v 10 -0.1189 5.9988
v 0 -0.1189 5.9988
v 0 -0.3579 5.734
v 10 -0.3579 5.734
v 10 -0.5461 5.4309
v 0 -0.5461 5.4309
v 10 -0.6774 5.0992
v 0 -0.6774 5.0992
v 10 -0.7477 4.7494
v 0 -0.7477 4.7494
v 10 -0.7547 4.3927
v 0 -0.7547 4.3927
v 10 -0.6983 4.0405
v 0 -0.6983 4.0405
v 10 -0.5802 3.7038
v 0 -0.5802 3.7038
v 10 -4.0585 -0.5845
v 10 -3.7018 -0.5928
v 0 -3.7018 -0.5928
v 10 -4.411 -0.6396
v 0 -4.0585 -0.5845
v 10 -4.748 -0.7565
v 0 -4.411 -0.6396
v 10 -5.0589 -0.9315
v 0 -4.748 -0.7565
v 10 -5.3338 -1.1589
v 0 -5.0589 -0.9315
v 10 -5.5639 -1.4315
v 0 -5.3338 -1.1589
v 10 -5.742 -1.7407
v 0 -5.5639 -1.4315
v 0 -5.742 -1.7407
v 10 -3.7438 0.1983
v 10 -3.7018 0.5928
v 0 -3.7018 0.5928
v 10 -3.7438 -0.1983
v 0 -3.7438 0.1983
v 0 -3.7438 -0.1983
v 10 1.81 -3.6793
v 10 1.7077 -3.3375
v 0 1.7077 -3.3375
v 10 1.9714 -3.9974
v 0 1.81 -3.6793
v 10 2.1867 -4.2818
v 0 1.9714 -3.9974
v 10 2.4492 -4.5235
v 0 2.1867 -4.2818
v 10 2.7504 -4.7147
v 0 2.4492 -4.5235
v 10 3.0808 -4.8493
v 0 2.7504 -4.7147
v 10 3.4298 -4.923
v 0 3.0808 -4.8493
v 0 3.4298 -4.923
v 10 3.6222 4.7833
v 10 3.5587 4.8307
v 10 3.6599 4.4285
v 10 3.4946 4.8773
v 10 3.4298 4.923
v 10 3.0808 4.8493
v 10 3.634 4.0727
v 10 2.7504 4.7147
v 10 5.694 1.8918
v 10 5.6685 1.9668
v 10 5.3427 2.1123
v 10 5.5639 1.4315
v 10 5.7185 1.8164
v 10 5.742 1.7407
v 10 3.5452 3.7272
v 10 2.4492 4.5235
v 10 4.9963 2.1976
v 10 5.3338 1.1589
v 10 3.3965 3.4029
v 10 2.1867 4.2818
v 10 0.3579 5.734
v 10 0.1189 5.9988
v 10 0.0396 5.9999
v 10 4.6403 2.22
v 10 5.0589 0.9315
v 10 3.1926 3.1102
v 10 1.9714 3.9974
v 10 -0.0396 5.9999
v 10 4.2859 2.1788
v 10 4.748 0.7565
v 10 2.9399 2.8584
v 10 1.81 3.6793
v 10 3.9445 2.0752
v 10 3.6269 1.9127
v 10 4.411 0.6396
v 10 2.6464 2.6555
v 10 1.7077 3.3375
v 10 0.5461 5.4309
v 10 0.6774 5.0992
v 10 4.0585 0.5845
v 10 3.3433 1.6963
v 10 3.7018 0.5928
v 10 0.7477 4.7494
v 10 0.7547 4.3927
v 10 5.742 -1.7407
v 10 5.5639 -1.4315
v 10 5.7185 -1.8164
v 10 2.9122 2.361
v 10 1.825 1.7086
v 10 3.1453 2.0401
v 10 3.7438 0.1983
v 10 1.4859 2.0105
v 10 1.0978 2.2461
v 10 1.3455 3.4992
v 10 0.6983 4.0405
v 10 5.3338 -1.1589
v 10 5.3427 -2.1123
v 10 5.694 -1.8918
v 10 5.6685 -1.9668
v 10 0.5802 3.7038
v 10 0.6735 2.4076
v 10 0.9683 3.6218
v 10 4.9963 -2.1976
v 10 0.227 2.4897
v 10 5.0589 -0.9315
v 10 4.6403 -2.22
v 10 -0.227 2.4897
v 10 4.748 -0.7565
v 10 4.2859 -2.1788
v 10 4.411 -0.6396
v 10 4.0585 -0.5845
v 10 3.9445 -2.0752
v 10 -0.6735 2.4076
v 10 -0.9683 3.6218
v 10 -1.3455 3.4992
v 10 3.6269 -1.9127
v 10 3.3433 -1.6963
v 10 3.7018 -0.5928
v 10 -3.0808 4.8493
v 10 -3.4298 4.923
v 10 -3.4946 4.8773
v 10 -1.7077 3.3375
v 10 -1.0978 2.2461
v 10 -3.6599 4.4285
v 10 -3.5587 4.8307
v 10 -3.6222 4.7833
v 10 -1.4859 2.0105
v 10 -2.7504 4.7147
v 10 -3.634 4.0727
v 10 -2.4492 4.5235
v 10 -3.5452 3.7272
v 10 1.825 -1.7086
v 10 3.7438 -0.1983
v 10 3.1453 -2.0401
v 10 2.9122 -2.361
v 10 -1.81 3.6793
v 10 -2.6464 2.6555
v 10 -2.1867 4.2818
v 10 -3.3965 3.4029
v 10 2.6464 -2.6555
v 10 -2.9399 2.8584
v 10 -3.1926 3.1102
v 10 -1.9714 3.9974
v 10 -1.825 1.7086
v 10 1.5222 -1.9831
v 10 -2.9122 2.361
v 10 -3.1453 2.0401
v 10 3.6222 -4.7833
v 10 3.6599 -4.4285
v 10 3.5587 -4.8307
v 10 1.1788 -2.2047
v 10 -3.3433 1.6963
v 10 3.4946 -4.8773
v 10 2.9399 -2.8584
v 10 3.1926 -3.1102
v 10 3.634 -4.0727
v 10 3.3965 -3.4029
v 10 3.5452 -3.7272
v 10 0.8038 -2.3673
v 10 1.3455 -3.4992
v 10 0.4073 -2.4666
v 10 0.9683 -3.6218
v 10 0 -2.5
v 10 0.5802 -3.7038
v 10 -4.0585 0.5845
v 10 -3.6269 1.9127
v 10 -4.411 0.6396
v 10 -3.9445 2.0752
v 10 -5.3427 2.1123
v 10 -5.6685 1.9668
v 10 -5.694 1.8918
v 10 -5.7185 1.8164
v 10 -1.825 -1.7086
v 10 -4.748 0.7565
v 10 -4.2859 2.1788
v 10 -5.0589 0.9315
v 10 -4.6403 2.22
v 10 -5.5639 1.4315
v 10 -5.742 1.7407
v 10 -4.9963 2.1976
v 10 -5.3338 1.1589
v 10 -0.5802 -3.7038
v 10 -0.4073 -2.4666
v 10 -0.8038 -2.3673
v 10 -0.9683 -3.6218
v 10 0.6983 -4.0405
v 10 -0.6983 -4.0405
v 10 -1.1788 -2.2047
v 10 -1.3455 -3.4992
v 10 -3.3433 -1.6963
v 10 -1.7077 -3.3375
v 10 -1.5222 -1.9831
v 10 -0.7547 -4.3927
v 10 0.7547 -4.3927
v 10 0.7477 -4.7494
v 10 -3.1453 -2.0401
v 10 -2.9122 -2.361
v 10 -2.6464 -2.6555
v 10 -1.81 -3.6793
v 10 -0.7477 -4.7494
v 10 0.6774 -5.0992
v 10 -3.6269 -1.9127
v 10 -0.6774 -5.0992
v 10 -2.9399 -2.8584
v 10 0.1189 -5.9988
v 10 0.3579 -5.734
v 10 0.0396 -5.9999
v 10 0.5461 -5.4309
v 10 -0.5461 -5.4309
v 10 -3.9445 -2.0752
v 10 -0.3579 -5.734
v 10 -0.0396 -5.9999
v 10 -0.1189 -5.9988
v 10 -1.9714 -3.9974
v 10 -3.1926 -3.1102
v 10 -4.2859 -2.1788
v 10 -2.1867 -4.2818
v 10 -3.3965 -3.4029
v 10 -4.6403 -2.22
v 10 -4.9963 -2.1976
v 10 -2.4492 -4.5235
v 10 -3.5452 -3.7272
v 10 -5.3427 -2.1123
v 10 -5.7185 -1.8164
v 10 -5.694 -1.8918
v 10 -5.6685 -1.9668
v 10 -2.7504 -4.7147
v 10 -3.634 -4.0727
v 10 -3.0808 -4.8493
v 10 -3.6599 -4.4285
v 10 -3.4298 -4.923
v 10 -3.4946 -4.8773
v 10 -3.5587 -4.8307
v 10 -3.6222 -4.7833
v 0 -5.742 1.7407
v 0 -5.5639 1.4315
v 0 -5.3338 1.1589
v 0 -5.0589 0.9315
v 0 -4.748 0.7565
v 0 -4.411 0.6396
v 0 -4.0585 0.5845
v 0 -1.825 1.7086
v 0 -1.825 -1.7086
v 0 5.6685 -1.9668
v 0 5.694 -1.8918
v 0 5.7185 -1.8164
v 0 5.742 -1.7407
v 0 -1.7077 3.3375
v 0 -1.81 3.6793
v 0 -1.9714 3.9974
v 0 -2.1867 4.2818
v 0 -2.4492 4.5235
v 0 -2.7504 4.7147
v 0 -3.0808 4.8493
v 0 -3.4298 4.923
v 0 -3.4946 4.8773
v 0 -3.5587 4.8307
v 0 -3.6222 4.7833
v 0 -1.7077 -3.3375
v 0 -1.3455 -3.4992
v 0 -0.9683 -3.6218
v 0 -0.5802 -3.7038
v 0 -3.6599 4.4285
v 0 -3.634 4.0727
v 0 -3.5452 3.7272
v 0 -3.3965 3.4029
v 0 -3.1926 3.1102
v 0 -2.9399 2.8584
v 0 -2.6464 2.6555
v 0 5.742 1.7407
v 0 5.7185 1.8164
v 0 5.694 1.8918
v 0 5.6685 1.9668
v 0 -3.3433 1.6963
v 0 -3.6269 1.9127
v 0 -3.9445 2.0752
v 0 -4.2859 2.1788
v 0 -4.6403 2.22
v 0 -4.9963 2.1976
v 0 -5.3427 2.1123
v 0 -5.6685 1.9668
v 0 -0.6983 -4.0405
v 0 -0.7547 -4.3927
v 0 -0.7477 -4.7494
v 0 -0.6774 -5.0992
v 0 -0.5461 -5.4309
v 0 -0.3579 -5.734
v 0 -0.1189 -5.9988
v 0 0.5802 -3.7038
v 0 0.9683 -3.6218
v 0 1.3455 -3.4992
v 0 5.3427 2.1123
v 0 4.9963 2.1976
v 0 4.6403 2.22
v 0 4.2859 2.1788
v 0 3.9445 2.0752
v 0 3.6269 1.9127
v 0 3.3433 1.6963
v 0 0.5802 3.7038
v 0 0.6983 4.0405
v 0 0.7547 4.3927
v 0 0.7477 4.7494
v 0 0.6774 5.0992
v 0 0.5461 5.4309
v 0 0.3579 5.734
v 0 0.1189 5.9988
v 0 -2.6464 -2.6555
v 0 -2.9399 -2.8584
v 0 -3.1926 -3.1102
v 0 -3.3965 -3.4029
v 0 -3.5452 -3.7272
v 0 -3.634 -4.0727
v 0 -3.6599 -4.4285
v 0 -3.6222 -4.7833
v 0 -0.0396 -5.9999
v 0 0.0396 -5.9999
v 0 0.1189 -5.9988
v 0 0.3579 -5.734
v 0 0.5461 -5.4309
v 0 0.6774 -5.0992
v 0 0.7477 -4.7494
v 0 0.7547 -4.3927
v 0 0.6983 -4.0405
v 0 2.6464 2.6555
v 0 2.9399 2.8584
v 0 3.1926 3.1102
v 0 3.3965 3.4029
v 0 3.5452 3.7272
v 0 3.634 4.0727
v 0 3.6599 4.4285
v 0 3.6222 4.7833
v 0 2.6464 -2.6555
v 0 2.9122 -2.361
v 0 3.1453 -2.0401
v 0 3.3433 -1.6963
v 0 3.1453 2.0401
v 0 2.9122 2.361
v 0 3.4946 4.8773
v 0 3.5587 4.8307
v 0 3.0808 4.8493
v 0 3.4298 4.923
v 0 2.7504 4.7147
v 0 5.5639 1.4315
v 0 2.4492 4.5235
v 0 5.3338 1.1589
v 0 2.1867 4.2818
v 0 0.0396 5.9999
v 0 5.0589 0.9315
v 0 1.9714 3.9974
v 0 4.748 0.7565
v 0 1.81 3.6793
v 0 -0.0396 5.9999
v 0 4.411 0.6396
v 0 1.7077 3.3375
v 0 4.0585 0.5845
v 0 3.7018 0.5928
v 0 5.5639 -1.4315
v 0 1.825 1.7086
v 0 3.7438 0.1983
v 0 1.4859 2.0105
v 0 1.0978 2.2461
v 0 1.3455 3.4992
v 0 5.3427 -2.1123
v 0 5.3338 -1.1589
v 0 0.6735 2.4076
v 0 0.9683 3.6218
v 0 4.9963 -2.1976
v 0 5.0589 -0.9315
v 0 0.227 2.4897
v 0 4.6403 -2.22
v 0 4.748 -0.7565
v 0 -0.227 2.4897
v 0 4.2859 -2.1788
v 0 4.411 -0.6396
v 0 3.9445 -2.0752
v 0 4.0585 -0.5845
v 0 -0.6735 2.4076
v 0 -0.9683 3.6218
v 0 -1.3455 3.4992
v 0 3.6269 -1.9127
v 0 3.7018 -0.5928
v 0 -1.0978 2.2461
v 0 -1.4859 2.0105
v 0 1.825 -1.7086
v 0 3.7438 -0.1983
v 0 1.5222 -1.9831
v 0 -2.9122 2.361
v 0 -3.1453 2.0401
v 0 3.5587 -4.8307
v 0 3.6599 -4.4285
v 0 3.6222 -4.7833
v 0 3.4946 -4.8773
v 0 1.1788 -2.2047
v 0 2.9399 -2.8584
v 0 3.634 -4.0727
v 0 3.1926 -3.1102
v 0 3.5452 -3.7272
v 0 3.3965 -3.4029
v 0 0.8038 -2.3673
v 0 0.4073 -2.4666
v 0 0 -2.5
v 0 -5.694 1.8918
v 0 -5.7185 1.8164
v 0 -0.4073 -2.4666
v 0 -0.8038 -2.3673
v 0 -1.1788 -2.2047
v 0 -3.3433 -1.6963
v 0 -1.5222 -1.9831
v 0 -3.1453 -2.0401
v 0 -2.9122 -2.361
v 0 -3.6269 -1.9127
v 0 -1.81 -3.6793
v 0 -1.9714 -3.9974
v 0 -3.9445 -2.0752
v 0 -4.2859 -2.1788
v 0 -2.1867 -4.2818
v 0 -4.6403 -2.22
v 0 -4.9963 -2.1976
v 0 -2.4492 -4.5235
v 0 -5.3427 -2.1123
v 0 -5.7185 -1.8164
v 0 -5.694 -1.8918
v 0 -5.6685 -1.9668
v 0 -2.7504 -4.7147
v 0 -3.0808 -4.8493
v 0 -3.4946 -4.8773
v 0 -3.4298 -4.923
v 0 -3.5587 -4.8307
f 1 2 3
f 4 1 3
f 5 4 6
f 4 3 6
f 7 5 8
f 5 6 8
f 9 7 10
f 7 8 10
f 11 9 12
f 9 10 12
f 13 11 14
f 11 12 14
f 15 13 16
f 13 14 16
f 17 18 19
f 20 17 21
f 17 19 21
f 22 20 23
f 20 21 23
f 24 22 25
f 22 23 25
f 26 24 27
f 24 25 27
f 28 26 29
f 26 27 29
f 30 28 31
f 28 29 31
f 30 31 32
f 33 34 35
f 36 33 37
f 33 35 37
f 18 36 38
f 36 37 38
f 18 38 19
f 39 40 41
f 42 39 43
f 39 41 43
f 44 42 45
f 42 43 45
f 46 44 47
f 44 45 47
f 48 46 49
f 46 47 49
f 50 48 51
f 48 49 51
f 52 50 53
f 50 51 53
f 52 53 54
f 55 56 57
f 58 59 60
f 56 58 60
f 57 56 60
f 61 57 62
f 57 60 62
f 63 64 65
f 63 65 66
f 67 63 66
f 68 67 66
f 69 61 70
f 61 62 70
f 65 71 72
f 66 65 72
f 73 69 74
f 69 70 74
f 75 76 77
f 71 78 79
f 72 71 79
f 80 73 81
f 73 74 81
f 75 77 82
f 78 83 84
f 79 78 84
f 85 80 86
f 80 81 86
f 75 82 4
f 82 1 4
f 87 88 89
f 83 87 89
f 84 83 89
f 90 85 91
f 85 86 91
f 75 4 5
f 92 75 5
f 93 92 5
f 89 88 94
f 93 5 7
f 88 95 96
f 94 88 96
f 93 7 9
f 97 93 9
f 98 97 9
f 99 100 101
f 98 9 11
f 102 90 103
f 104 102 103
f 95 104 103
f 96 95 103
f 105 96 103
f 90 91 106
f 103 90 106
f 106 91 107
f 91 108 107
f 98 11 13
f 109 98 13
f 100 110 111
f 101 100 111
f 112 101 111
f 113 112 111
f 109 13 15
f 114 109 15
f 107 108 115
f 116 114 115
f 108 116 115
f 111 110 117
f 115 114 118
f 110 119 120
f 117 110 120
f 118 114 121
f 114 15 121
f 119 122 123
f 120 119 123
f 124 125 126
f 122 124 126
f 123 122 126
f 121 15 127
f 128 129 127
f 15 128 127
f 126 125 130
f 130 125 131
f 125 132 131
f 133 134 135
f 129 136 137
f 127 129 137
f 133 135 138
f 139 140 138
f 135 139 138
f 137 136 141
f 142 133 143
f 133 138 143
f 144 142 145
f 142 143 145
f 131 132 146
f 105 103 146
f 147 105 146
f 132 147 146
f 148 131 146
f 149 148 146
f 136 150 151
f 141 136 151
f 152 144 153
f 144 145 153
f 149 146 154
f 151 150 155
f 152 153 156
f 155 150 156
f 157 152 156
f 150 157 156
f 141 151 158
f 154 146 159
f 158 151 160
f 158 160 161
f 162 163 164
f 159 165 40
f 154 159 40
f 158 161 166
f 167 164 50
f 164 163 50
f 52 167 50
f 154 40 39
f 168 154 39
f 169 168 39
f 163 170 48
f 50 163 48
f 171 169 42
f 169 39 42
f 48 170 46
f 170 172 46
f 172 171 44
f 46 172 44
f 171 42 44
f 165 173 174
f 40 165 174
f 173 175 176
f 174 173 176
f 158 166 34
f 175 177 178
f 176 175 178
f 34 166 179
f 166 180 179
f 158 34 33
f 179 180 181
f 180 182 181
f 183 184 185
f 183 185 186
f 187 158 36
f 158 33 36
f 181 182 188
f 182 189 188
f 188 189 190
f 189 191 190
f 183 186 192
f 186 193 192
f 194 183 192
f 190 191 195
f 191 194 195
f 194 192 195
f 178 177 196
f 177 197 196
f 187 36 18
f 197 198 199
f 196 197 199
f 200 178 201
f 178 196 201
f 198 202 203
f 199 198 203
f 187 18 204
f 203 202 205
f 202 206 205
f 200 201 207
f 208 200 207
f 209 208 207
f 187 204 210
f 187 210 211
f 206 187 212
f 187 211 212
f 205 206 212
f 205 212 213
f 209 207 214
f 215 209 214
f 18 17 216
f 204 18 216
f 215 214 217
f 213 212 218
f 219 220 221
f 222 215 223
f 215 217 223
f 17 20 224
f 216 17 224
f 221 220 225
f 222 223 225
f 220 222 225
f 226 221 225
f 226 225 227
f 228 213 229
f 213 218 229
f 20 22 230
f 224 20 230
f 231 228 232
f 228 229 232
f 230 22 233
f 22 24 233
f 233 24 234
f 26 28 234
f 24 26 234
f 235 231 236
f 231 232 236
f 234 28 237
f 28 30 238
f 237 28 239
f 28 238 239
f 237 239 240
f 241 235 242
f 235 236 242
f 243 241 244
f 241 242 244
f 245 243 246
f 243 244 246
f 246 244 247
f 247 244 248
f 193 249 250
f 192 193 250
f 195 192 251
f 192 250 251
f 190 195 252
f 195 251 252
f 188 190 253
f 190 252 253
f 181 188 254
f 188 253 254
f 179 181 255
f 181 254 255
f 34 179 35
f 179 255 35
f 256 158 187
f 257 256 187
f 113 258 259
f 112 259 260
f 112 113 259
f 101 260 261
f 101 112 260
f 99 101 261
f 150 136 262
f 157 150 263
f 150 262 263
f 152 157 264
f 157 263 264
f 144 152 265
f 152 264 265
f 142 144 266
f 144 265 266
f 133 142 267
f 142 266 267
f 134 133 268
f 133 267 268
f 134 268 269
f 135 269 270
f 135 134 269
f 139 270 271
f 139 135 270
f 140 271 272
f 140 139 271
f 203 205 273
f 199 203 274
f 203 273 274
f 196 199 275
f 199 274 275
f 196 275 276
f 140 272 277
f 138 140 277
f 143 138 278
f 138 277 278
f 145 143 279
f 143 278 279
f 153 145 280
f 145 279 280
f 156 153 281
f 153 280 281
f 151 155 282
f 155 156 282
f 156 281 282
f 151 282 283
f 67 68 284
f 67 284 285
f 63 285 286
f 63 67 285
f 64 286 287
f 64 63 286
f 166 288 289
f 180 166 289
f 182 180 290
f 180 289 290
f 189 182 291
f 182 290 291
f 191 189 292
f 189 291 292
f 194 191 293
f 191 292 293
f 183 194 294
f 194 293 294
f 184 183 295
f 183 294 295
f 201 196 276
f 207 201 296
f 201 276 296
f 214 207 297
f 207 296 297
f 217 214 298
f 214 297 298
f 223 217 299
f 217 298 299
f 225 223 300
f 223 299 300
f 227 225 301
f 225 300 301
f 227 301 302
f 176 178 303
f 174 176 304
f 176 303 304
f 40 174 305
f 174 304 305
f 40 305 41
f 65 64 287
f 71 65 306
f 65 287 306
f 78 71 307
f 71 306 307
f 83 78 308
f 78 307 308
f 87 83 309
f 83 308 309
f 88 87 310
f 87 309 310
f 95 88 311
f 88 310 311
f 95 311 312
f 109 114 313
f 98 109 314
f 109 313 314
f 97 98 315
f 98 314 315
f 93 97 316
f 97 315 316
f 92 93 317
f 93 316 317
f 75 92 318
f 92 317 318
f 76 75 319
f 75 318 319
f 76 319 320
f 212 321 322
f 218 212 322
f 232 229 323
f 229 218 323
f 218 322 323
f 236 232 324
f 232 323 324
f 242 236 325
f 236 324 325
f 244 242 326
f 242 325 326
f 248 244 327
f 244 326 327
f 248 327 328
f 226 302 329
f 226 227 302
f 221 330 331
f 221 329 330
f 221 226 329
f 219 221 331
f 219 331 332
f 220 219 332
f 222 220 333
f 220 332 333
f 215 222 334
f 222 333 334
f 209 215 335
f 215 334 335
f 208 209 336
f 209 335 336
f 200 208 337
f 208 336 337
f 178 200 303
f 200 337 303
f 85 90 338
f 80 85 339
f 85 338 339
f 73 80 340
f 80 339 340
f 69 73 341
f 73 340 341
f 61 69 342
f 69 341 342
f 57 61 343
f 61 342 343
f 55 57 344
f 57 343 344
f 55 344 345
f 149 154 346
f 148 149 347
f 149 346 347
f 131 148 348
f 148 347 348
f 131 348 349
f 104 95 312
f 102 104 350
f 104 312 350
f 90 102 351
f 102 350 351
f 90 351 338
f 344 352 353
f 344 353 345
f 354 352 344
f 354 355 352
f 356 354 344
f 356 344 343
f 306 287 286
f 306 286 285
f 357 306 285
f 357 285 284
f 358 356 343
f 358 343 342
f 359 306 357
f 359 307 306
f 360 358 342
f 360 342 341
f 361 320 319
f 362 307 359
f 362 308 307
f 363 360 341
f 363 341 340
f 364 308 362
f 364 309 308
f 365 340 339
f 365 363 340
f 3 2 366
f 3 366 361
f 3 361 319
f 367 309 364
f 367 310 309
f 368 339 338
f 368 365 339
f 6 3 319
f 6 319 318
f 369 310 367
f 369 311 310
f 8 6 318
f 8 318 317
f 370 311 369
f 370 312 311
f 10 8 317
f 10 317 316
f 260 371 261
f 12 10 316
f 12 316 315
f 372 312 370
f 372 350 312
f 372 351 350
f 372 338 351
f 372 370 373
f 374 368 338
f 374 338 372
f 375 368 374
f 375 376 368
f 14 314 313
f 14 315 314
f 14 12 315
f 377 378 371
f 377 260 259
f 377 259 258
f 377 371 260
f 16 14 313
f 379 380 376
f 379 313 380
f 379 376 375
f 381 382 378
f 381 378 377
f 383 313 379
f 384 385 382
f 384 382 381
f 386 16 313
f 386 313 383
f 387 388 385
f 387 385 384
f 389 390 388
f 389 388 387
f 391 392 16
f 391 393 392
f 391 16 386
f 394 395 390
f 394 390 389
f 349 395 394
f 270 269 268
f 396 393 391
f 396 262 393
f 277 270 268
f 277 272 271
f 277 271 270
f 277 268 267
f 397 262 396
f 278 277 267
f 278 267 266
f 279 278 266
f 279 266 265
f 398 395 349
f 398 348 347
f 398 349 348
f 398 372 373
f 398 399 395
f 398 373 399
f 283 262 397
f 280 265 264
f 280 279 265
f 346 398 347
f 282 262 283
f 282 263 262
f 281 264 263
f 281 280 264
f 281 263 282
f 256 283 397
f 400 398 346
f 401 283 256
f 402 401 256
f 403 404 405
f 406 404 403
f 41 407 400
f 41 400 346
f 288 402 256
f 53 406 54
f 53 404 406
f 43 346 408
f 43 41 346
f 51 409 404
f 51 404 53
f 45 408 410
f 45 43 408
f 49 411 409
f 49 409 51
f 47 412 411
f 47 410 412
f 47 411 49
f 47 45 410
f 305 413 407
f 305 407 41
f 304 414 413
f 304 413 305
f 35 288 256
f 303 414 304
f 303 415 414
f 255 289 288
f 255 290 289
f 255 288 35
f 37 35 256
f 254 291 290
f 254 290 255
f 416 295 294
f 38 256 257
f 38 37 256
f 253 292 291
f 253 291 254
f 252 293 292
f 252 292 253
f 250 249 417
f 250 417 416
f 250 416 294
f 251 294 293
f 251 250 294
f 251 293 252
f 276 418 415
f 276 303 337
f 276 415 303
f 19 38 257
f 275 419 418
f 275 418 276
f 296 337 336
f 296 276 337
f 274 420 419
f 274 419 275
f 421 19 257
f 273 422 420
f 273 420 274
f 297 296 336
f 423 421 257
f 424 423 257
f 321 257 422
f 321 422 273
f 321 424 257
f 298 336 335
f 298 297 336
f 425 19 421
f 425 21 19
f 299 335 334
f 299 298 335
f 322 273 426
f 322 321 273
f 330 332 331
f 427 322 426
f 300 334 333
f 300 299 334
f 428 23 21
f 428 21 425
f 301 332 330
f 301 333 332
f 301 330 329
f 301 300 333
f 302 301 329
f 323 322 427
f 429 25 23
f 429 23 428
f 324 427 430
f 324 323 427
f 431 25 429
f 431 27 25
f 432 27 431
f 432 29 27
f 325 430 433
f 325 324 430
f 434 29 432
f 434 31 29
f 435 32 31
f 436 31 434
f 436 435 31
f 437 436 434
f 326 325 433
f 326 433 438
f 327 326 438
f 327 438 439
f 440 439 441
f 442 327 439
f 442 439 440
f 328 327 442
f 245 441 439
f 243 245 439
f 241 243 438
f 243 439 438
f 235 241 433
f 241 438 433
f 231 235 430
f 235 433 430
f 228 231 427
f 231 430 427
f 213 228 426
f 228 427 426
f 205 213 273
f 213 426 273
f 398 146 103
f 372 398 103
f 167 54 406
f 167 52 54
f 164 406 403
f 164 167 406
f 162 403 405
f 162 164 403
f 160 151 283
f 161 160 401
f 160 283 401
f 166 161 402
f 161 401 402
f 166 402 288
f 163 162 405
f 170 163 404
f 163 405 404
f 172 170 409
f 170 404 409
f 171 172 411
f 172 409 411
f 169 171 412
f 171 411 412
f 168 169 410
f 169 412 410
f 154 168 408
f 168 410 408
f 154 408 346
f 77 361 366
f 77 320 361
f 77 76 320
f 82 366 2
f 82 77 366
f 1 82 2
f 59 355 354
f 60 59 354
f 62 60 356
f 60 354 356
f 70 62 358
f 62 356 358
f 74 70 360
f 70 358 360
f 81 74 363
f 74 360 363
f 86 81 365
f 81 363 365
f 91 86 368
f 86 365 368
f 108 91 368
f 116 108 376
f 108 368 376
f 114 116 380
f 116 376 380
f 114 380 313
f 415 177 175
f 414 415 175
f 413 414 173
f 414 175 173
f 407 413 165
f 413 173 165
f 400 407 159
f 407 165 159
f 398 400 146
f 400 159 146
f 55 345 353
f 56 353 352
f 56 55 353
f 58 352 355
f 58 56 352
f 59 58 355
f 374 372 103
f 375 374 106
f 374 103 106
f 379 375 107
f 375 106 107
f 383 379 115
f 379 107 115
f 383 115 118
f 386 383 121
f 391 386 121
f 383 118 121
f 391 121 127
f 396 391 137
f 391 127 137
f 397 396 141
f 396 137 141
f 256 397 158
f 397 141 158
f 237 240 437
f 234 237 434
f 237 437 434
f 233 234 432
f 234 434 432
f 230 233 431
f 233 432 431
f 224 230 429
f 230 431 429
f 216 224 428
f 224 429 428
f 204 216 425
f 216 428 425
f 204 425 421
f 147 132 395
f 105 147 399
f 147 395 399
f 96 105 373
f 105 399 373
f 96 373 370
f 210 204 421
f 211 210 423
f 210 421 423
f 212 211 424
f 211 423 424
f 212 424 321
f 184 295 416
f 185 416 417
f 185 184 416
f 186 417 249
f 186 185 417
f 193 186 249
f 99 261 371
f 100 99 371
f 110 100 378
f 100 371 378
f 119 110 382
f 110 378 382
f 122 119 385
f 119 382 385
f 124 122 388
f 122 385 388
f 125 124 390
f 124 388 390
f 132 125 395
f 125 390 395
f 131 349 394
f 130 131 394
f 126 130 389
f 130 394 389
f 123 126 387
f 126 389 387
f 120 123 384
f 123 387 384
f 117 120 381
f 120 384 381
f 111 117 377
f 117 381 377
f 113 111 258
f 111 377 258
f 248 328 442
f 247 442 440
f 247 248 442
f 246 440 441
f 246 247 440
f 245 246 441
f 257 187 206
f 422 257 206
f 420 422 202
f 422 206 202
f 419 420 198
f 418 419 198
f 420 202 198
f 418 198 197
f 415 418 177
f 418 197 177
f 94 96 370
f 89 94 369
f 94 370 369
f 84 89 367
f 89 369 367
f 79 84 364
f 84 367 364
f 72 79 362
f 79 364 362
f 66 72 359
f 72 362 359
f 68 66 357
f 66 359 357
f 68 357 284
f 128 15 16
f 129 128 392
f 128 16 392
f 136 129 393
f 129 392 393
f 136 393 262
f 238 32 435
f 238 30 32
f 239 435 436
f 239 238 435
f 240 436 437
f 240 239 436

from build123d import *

# Parameters (mm, degrees)
BASPROSKE_W        = 10
BASPROSKE_H        = 6
TOOTHCUT_DEPTH     = 14.114877049
TEETHCUTS_COUNT    = 10
TEETHCUTS_ANGLE    = 324
BORSKE_R           = 0.4
BORE_DEPTH         = 50.0000508
SKETCH1_R          = 0.4
CUT_EXTRUDE1_DEPTH = 13.998849476


with BuildPart() as part:
    # BasProSke → Base-Revolve (revolve)
    with BuildSketch(Plane(origin=(0, 0, 0), x_dir=(1, 0, 0), z_dir=(0, 1, 0)), mode=Mode.PRIVATE) as base_revolve_sk:
        with Locations((5, 3)):
            Rectangle(BASPROSKE_W, BASPROSKE_H)
    revolve(base_revolve_sk.sketch.rotate(Axis((-10, 0, 0), (1, 0, 0)), 180), axis=Axis((-10, 0, 0), (1, 0, 0)))

    # TooCutSke → ToothCut (cut, through all)
    with BuildSketch(Plane(origin=(0, 0, 0), x_dir=(0, 0, -1), z_dir=(1, 0, 0))):
        with BuildLine():
            ThreePointArc((0.59278292, 3.701838653), (0, 3.749), (-0.59278292, 3.701838653))
            ThreePointArc((-0.59278292, 3.701838653), (-0.846593509, 4.924114224), (-1.775771316, 5.757784417))
            ThreePointArc((-1.775771316, 5.757784417), (0, 6.0254), (1.775771316, 5.757784417))
            ThreePointArc((1.775771316, 5.757784417), (0.846593509, 4.924114224), (0.59278292, 3.701838653))
        make_face()
    toothcut = extrude(amount=TOOTHCUT_DEPTH, mode=Mode.SUBTRACT)

    # TeethCuts: ToothCut ×10 about axis
    teethcuts_axis = Axis((-10, 0, 0), (1, 0, 0))
    for i in range(1, TEETHCUTS_COUNT):
        add(toothcut.rotate(teethcuts_axis, i * TEETHCUTS_ANGLE / (TEETHCUTS_COUNT - 1)), mode=Mode.SUBTRACT)

    # BorSke → Bore (cut, symmetric)
    with BuildSketch(Plane(origin=(0, 0, 0), x_dir=(0, 0, -1), z_dir=(1, 0, 0))):
        with Locations(Location((0, 0, 0), (0, 0, 180))):
            Circle(BORSKE_R)
    extrude(amount=BORE_DEPTH, both=True, mode=Mode.SUBTRACT)

    # Sketch1 → Cut-Extrude1 (cut, through all)
    with BuildSketch(Plane(origin=(10, 0, 0), x_dir=(0, 0, -1), z_dir=(1, 0, 0))):
        with BuildLine():
            ThreePointArc((-1.708617862, 1.825), (-2.5, 0), (-1.708617862, -1.825))
            Line((-1.708617862, -1.825), (1.708617862, -1.825))
            ThreePointArc((1.708617862, -1.825), (2.293637358, -0.994599252), (2.5, 0))
            ThreePointArc((2.5, 0), (2.293637358, 0.994599252), (1.708617862, 1.825))
            Line((1.708617862, 1.825), (-1.708617862, 1.825))
        make_face()
        Circle(SKETCH1_R, mode=Mode.SUBTRACT)
    extrude(amount=-CUT_EXTRUDE1_DEPTH, mode=Mode.SUBTRACT)


solid = part.part
